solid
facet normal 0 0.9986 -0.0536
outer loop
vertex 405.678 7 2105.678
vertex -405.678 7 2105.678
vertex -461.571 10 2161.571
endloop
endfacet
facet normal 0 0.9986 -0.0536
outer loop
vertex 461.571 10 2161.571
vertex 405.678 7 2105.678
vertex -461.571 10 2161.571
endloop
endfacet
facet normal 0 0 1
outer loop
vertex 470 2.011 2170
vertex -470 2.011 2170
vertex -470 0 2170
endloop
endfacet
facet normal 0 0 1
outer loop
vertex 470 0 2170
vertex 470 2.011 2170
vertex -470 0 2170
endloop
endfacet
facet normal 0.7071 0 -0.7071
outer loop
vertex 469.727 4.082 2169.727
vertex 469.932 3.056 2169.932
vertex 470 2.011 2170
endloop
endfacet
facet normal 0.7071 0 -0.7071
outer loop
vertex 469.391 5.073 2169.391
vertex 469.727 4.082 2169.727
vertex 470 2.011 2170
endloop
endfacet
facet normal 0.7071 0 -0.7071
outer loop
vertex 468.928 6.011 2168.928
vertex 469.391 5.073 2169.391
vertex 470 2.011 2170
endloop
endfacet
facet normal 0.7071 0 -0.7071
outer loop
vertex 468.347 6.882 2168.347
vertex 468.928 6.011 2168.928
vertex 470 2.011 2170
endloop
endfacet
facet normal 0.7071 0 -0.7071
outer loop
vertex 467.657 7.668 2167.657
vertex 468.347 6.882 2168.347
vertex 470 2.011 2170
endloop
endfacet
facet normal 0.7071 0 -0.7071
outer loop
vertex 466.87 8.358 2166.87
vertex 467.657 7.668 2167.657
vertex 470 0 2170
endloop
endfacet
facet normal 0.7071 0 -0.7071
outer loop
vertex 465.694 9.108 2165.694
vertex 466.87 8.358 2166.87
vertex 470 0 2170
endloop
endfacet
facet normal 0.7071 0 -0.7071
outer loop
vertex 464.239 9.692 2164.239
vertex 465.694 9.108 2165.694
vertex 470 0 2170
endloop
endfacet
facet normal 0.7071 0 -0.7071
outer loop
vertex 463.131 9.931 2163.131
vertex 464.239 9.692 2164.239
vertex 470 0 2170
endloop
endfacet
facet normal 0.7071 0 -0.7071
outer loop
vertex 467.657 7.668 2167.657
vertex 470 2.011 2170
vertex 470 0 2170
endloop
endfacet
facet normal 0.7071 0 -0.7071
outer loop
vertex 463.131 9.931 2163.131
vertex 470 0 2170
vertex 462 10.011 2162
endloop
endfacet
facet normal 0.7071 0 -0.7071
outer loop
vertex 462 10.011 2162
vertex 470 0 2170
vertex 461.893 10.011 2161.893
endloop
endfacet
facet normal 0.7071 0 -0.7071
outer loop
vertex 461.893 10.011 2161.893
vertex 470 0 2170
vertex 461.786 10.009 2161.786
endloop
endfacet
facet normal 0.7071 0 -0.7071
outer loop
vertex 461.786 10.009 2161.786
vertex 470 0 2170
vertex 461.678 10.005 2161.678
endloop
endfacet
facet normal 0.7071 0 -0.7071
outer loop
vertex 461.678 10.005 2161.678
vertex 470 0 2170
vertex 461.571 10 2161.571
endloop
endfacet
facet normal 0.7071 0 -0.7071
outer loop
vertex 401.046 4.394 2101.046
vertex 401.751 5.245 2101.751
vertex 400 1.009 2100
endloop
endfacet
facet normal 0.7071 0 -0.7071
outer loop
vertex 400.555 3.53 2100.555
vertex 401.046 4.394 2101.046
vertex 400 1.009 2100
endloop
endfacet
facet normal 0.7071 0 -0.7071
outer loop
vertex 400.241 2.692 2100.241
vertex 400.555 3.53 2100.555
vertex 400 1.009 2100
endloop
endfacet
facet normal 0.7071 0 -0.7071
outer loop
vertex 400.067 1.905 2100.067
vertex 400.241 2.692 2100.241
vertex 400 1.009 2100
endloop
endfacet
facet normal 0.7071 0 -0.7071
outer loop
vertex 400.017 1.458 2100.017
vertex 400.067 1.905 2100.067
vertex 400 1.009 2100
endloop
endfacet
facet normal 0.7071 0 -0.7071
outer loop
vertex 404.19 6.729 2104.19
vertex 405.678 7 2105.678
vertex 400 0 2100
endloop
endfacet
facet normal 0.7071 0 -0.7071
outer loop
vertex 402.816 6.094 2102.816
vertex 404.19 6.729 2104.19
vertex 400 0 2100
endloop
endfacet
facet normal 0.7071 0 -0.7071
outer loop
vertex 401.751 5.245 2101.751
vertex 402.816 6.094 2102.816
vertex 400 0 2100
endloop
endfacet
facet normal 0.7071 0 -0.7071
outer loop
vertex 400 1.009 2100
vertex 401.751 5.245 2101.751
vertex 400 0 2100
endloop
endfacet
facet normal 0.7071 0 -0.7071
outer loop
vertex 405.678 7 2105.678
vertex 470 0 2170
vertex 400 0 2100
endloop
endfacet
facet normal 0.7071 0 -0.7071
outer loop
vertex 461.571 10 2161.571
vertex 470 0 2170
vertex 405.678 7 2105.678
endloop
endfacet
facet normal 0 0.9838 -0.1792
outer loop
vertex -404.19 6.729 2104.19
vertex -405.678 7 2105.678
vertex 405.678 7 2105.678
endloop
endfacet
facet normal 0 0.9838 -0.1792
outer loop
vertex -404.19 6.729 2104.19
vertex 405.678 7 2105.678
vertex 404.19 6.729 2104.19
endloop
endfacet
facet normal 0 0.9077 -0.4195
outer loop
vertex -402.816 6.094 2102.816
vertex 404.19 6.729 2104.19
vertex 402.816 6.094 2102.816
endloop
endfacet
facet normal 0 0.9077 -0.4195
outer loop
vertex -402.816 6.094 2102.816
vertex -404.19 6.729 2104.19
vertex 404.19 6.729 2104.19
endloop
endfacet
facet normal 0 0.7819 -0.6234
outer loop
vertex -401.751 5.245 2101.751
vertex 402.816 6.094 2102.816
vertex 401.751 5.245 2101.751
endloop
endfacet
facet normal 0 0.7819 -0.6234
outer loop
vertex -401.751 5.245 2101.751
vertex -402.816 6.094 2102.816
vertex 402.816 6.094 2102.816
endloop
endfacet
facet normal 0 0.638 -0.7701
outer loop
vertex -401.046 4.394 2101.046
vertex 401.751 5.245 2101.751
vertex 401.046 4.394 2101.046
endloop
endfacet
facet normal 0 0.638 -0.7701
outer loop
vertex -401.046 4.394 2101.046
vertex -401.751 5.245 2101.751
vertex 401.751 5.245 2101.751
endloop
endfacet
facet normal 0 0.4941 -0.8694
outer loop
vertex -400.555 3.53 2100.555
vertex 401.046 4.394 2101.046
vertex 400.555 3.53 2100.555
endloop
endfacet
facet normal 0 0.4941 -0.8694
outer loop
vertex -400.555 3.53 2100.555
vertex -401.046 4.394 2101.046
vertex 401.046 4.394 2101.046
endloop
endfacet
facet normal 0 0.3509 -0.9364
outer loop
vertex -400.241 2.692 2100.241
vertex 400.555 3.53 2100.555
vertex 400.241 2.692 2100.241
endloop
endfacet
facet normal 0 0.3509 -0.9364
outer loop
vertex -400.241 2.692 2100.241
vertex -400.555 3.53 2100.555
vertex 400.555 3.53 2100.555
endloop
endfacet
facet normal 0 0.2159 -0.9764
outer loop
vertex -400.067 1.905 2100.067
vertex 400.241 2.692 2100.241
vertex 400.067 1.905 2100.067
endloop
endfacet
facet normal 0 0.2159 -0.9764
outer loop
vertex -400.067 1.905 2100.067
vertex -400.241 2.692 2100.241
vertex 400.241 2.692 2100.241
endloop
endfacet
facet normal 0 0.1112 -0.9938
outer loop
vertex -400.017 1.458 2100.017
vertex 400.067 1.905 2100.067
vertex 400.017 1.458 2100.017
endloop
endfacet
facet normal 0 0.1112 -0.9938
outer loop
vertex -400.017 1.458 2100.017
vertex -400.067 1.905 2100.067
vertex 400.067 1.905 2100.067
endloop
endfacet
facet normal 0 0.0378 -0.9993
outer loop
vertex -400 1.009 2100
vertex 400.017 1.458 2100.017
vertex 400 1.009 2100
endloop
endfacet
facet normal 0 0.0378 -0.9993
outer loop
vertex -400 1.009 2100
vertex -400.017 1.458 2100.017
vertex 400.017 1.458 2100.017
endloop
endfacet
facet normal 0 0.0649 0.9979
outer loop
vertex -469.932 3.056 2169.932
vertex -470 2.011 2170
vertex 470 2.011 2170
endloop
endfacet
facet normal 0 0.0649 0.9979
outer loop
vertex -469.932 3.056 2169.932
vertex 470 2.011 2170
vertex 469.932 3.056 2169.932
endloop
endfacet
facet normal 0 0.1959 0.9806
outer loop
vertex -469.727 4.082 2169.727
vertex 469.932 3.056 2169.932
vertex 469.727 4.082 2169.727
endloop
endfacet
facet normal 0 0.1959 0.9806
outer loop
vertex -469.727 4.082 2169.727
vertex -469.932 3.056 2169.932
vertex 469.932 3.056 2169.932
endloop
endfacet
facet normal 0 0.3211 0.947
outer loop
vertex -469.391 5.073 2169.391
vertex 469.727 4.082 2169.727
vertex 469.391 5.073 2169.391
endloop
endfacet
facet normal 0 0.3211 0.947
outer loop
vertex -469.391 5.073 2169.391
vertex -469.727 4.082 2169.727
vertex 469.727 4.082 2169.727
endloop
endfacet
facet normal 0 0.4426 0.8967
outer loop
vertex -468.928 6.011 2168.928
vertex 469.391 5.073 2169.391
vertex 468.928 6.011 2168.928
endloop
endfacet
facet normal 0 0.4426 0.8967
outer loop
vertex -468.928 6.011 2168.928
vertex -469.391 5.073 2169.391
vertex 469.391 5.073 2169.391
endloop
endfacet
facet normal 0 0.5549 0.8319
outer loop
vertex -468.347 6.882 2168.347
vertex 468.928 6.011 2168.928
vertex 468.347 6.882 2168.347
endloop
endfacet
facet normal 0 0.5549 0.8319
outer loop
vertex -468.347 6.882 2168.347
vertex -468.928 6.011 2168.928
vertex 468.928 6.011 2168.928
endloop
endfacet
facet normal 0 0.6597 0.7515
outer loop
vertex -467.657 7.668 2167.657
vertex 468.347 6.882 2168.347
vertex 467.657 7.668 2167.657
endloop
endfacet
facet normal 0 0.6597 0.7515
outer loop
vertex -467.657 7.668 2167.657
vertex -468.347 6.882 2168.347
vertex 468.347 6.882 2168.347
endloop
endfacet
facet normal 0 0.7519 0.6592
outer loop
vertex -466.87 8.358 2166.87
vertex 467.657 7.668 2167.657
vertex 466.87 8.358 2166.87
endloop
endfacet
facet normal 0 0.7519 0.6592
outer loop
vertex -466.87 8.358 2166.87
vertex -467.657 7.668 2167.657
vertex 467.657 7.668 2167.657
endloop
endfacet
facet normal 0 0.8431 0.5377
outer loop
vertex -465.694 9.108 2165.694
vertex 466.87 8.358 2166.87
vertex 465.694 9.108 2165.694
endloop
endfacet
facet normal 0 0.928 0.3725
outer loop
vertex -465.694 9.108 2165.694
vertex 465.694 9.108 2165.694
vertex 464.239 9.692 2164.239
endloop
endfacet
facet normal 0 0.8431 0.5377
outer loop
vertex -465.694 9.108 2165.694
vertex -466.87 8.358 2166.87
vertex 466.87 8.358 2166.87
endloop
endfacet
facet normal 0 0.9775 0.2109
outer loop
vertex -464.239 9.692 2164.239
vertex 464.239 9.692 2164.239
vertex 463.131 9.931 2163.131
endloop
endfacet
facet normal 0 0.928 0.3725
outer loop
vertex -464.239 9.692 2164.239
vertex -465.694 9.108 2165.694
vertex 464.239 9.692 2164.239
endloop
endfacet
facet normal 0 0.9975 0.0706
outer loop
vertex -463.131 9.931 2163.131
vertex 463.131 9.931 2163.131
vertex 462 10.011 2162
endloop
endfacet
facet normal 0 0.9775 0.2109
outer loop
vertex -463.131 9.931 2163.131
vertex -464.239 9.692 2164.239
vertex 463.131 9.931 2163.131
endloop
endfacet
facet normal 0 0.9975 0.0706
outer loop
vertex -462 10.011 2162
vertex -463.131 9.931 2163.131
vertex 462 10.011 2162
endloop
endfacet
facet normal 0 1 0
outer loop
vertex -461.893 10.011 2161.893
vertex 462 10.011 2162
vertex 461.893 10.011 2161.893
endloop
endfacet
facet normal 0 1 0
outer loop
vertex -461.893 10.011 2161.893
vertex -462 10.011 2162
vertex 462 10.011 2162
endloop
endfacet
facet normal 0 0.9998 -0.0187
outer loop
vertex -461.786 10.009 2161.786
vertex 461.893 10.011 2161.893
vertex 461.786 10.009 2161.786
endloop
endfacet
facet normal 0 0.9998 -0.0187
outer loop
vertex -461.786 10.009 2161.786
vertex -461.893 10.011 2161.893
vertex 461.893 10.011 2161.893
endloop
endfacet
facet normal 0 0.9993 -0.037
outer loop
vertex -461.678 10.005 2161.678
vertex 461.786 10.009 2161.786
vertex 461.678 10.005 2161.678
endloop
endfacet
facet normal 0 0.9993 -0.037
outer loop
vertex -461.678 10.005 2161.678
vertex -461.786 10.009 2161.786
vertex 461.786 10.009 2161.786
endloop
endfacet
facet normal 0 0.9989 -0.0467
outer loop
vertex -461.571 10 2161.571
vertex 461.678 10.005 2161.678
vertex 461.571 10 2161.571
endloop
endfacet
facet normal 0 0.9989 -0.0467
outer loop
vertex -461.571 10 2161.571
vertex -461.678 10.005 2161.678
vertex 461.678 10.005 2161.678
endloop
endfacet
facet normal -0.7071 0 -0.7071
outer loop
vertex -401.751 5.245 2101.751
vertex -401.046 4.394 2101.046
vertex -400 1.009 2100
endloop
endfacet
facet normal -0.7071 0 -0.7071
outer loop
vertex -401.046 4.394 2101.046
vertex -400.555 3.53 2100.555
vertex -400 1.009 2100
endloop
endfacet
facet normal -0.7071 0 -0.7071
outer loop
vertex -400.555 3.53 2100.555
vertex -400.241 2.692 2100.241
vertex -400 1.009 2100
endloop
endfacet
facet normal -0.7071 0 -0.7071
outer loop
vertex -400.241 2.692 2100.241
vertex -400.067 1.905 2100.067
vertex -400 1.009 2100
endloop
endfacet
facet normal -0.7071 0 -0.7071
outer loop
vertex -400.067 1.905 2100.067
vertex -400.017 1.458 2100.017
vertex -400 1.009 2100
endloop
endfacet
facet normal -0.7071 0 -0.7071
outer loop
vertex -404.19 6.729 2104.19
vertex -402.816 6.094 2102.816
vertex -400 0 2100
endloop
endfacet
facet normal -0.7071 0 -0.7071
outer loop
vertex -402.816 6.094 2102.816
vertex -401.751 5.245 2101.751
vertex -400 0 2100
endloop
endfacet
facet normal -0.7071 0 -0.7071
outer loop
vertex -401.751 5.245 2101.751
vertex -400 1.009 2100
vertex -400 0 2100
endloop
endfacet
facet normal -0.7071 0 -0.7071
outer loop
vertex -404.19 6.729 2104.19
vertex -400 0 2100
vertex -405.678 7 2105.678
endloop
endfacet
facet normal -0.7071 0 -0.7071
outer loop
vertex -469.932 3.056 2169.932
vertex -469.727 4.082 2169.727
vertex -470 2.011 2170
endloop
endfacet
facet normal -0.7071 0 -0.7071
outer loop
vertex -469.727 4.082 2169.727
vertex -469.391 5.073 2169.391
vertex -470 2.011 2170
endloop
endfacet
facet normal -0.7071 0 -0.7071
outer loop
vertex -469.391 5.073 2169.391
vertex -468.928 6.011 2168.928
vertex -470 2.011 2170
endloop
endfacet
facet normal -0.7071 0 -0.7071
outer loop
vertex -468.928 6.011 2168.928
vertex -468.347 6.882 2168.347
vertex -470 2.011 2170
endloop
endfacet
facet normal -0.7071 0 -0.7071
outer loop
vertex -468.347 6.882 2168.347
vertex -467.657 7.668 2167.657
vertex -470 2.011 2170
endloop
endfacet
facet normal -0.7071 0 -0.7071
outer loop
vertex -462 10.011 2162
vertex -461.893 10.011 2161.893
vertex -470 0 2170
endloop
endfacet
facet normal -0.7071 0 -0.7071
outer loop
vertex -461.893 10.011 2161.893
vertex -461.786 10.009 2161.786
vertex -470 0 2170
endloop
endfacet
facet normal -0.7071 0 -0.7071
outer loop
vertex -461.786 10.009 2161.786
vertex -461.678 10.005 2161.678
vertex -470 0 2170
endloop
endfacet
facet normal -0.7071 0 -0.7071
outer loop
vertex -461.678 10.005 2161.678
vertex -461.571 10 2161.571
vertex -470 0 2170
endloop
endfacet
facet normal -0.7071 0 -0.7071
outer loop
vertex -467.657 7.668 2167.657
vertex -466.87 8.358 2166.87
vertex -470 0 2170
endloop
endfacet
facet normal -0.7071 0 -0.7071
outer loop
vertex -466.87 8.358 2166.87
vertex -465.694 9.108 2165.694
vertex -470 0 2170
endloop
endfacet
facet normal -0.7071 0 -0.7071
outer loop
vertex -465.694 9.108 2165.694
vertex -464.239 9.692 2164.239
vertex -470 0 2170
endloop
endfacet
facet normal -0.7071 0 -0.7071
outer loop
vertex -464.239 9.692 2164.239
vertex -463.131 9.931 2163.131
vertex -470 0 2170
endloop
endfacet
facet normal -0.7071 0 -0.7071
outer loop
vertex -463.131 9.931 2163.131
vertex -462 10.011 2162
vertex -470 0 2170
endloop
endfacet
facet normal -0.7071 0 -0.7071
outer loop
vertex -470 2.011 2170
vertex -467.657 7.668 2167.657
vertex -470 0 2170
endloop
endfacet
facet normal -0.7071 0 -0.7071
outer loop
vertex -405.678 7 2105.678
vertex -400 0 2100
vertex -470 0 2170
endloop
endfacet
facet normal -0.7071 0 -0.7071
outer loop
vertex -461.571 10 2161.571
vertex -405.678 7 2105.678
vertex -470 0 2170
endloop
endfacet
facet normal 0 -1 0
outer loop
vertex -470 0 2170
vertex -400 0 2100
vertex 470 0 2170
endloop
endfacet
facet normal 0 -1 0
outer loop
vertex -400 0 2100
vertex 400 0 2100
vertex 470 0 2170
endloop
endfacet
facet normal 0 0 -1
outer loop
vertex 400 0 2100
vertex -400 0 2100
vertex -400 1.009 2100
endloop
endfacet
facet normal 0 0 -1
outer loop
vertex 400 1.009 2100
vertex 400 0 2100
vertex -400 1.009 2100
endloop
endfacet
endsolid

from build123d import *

# Parameters (mm, degrees)
EXTRUDE039434_DEPTH = 500


with BuildPart() as extrude039434_internal_superior:
    # Sketch223 (on Sketch) → Extrude039434 (new body, symmetric)
    with BuildSketch(Plane.XZ):
        Polygon((-600, 2300), (600, 2300), (200, 1900), (-200, 1900), align=None)
    extrude(amount=EXTRUDE039434_DEPTH, both=True)


with BuildPart() as internal_trim_horizontal:
    # Sweep012: sweep along a path in Sketch195
    with BuildLine(Plane.XZ) as sweep012_path:
        Line((-400, 2100), (-400, 0))
        Line((-400, 0), (400, 0))
        Line((400, 0), (400, 2100))
        Line((400, 2100), (-400, 2100))
    # Clone2D028 (on Sketch) → Sweep012 (sweep)
    with BuildSketch(Plane.ZY):
        with BuildLine():
            Line((-61.571224, 10), (-5.678418, 7))
            ThreePointArc((-5.678418, 7), (-1.645147, 5.136003), (0, 1.008624))
            Line((0, 1.008624), (0, 0))
            Line((0, 0), (-70, 0))
            Line((-70, 0), (-70, 2.011499))
            ThreePointArc((-70, 2.011499), (-67.503171, 7.81797), (-61.571224, 10))
        make_face()
    sweep(path=sweep012_path.line, is_frenet=True, transition=Transition.RIGHT)

    # Common001: intersect Extrude039434_Internal_superior_
    add(extrude039434_internal_superior.part, mode=Mode.INTERSECT)


solid = internal_trim_horizontal.part
